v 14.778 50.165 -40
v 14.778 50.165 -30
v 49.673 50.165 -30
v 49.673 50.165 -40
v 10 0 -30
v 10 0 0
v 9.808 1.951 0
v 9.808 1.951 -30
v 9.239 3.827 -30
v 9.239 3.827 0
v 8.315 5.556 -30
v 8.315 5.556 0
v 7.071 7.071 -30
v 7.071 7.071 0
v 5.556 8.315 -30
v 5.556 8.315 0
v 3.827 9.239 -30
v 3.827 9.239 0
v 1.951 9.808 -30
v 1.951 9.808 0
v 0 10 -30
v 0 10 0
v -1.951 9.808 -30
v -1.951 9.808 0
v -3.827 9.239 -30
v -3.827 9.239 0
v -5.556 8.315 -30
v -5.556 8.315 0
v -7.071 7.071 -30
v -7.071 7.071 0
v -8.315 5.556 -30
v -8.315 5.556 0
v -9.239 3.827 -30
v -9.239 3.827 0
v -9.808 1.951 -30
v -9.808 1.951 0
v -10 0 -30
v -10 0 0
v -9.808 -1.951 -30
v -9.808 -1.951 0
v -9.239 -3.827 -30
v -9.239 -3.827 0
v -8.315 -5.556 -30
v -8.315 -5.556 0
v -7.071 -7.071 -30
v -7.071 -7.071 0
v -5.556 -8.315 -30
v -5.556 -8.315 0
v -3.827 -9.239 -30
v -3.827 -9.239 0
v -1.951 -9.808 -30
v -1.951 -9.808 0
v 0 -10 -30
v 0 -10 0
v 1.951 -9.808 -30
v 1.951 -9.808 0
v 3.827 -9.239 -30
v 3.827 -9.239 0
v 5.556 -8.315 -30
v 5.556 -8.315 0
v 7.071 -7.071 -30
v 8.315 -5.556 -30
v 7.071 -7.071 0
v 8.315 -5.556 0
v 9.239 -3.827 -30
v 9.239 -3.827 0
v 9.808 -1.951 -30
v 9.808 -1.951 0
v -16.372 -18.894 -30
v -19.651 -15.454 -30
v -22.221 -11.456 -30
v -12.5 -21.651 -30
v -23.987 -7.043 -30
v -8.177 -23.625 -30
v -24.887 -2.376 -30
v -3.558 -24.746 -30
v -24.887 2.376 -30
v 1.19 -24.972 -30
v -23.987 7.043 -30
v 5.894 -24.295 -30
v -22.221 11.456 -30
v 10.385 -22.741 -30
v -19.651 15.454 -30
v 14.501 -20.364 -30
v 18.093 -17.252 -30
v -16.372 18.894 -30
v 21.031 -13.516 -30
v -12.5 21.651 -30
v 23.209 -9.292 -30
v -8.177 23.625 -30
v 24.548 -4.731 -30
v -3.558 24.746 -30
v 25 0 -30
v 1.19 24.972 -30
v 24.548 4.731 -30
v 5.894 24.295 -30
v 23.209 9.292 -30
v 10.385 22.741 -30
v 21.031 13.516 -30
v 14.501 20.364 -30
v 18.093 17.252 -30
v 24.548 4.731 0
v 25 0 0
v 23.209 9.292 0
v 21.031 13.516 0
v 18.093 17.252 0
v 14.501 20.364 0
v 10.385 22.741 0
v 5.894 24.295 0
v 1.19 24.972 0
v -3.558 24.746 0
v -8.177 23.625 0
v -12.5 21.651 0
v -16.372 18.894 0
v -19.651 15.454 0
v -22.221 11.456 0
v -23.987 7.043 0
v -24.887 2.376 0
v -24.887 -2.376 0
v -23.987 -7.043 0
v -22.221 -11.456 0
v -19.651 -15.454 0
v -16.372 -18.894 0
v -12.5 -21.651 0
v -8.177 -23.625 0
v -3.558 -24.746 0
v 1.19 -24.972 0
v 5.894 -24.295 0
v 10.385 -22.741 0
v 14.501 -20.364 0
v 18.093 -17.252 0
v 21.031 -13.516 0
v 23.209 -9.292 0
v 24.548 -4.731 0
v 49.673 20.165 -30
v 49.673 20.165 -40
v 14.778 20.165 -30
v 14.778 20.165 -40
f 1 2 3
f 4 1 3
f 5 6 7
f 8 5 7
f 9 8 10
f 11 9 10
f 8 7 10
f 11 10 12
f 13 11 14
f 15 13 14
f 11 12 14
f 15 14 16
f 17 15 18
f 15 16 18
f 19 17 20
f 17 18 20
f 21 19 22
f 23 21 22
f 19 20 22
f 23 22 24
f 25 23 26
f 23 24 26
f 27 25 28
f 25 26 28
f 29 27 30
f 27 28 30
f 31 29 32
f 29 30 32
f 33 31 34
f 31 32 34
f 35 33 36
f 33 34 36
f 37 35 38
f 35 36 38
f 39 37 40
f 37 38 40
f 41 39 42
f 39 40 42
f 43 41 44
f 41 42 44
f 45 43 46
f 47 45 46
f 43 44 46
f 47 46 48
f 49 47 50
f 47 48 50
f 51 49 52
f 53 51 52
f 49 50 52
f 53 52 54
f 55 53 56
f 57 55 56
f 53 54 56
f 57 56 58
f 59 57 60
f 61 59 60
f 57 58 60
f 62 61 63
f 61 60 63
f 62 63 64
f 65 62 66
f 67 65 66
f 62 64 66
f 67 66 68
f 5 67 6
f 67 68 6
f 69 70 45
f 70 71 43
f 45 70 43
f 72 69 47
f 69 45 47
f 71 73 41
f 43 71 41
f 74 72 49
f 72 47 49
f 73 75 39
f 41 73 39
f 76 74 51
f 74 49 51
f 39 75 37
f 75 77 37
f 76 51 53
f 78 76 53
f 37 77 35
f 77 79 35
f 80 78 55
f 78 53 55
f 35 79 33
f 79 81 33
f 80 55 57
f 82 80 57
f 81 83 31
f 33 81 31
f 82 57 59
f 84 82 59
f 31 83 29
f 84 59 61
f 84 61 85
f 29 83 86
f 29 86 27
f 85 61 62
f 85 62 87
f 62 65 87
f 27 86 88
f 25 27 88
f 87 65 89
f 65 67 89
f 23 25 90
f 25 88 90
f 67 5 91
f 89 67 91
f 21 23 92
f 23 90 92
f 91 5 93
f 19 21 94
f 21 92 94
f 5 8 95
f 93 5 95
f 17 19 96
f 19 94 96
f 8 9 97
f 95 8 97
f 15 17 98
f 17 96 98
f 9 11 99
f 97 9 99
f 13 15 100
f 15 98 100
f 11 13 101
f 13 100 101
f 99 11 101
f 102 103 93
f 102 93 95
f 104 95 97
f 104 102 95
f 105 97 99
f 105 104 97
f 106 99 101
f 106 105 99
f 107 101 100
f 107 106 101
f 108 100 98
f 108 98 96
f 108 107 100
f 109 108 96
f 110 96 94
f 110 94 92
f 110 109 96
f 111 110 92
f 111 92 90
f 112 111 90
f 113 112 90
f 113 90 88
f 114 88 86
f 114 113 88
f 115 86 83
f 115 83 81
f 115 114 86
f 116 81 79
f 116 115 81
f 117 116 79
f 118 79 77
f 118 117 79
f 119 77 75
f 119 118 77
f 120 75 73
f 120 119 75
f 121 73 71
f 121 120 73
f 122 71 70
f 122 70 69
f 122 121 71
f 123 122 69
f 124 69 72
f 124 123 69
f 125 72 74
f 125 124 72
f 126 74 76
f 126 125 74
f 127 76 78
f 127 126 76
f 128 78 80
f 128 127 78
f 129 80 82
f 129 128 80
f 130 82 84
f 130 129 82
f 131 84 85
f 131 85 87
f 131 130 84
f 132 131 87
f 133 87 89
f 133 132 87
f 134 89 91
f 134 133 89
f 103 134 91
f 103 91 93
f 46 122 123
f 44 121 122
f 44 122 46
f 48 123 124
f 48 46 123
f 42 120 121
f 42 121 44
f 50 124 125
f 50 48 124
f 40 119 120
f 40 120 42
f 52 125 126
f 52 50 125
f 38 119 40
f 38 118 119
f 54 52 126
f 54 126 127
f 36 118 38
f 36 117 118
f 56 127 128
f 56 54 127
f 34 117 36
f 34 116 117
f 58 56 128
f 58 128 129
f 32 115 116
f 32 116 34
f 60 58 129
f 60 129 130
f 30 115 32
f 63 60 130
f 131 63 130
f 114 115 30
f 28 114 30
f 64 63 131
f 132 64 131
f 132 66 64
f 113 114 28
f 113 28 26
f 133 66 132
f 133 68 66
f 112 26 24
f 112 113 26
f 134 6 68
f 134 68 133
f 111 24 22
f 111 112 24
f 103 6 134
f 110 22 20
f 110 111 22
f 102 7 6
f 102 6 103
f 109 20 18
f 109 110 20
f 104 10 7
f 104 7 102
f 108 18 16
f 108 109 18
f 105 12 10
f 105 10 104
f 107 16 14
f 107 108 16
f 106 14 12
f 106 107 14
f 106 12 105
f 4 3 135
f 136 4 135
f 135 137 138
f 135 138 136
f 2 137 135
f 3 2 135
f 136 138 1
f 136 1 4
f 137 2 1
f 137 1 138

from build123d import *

# Parameters (mm, degrees)
F0_R     = 25
F0_R_2   = 10
F1_DEPTH = 30
F2_W     = 34.895231
F2_H     = 30
F3_DEPTH = 10


with BuildPart() as f1:
    # F0 (on Top) → F1 (new body)
    with BuildSketch(Plane.XY):
        Circle(F0_R)
        Circle(F0_R_2, mode=Mode.SUBTRACT)
    extrude(amount=-F1_DEPTH)


with BuildPart() as f3:
    # F2 (on face) → F3 (new body)
    with BuildSketch(Plane(origin=(0, 0, -30), x_dir=(1, 0, 0), z_dir=(0, 0, -1))):
        with Locations((32.225293, -35.164828)):
            Rectangle(F2_W, F2_H)
    extrude(amount=F3_DEPTH)


solid = Compound([f1.part, f3.part])
